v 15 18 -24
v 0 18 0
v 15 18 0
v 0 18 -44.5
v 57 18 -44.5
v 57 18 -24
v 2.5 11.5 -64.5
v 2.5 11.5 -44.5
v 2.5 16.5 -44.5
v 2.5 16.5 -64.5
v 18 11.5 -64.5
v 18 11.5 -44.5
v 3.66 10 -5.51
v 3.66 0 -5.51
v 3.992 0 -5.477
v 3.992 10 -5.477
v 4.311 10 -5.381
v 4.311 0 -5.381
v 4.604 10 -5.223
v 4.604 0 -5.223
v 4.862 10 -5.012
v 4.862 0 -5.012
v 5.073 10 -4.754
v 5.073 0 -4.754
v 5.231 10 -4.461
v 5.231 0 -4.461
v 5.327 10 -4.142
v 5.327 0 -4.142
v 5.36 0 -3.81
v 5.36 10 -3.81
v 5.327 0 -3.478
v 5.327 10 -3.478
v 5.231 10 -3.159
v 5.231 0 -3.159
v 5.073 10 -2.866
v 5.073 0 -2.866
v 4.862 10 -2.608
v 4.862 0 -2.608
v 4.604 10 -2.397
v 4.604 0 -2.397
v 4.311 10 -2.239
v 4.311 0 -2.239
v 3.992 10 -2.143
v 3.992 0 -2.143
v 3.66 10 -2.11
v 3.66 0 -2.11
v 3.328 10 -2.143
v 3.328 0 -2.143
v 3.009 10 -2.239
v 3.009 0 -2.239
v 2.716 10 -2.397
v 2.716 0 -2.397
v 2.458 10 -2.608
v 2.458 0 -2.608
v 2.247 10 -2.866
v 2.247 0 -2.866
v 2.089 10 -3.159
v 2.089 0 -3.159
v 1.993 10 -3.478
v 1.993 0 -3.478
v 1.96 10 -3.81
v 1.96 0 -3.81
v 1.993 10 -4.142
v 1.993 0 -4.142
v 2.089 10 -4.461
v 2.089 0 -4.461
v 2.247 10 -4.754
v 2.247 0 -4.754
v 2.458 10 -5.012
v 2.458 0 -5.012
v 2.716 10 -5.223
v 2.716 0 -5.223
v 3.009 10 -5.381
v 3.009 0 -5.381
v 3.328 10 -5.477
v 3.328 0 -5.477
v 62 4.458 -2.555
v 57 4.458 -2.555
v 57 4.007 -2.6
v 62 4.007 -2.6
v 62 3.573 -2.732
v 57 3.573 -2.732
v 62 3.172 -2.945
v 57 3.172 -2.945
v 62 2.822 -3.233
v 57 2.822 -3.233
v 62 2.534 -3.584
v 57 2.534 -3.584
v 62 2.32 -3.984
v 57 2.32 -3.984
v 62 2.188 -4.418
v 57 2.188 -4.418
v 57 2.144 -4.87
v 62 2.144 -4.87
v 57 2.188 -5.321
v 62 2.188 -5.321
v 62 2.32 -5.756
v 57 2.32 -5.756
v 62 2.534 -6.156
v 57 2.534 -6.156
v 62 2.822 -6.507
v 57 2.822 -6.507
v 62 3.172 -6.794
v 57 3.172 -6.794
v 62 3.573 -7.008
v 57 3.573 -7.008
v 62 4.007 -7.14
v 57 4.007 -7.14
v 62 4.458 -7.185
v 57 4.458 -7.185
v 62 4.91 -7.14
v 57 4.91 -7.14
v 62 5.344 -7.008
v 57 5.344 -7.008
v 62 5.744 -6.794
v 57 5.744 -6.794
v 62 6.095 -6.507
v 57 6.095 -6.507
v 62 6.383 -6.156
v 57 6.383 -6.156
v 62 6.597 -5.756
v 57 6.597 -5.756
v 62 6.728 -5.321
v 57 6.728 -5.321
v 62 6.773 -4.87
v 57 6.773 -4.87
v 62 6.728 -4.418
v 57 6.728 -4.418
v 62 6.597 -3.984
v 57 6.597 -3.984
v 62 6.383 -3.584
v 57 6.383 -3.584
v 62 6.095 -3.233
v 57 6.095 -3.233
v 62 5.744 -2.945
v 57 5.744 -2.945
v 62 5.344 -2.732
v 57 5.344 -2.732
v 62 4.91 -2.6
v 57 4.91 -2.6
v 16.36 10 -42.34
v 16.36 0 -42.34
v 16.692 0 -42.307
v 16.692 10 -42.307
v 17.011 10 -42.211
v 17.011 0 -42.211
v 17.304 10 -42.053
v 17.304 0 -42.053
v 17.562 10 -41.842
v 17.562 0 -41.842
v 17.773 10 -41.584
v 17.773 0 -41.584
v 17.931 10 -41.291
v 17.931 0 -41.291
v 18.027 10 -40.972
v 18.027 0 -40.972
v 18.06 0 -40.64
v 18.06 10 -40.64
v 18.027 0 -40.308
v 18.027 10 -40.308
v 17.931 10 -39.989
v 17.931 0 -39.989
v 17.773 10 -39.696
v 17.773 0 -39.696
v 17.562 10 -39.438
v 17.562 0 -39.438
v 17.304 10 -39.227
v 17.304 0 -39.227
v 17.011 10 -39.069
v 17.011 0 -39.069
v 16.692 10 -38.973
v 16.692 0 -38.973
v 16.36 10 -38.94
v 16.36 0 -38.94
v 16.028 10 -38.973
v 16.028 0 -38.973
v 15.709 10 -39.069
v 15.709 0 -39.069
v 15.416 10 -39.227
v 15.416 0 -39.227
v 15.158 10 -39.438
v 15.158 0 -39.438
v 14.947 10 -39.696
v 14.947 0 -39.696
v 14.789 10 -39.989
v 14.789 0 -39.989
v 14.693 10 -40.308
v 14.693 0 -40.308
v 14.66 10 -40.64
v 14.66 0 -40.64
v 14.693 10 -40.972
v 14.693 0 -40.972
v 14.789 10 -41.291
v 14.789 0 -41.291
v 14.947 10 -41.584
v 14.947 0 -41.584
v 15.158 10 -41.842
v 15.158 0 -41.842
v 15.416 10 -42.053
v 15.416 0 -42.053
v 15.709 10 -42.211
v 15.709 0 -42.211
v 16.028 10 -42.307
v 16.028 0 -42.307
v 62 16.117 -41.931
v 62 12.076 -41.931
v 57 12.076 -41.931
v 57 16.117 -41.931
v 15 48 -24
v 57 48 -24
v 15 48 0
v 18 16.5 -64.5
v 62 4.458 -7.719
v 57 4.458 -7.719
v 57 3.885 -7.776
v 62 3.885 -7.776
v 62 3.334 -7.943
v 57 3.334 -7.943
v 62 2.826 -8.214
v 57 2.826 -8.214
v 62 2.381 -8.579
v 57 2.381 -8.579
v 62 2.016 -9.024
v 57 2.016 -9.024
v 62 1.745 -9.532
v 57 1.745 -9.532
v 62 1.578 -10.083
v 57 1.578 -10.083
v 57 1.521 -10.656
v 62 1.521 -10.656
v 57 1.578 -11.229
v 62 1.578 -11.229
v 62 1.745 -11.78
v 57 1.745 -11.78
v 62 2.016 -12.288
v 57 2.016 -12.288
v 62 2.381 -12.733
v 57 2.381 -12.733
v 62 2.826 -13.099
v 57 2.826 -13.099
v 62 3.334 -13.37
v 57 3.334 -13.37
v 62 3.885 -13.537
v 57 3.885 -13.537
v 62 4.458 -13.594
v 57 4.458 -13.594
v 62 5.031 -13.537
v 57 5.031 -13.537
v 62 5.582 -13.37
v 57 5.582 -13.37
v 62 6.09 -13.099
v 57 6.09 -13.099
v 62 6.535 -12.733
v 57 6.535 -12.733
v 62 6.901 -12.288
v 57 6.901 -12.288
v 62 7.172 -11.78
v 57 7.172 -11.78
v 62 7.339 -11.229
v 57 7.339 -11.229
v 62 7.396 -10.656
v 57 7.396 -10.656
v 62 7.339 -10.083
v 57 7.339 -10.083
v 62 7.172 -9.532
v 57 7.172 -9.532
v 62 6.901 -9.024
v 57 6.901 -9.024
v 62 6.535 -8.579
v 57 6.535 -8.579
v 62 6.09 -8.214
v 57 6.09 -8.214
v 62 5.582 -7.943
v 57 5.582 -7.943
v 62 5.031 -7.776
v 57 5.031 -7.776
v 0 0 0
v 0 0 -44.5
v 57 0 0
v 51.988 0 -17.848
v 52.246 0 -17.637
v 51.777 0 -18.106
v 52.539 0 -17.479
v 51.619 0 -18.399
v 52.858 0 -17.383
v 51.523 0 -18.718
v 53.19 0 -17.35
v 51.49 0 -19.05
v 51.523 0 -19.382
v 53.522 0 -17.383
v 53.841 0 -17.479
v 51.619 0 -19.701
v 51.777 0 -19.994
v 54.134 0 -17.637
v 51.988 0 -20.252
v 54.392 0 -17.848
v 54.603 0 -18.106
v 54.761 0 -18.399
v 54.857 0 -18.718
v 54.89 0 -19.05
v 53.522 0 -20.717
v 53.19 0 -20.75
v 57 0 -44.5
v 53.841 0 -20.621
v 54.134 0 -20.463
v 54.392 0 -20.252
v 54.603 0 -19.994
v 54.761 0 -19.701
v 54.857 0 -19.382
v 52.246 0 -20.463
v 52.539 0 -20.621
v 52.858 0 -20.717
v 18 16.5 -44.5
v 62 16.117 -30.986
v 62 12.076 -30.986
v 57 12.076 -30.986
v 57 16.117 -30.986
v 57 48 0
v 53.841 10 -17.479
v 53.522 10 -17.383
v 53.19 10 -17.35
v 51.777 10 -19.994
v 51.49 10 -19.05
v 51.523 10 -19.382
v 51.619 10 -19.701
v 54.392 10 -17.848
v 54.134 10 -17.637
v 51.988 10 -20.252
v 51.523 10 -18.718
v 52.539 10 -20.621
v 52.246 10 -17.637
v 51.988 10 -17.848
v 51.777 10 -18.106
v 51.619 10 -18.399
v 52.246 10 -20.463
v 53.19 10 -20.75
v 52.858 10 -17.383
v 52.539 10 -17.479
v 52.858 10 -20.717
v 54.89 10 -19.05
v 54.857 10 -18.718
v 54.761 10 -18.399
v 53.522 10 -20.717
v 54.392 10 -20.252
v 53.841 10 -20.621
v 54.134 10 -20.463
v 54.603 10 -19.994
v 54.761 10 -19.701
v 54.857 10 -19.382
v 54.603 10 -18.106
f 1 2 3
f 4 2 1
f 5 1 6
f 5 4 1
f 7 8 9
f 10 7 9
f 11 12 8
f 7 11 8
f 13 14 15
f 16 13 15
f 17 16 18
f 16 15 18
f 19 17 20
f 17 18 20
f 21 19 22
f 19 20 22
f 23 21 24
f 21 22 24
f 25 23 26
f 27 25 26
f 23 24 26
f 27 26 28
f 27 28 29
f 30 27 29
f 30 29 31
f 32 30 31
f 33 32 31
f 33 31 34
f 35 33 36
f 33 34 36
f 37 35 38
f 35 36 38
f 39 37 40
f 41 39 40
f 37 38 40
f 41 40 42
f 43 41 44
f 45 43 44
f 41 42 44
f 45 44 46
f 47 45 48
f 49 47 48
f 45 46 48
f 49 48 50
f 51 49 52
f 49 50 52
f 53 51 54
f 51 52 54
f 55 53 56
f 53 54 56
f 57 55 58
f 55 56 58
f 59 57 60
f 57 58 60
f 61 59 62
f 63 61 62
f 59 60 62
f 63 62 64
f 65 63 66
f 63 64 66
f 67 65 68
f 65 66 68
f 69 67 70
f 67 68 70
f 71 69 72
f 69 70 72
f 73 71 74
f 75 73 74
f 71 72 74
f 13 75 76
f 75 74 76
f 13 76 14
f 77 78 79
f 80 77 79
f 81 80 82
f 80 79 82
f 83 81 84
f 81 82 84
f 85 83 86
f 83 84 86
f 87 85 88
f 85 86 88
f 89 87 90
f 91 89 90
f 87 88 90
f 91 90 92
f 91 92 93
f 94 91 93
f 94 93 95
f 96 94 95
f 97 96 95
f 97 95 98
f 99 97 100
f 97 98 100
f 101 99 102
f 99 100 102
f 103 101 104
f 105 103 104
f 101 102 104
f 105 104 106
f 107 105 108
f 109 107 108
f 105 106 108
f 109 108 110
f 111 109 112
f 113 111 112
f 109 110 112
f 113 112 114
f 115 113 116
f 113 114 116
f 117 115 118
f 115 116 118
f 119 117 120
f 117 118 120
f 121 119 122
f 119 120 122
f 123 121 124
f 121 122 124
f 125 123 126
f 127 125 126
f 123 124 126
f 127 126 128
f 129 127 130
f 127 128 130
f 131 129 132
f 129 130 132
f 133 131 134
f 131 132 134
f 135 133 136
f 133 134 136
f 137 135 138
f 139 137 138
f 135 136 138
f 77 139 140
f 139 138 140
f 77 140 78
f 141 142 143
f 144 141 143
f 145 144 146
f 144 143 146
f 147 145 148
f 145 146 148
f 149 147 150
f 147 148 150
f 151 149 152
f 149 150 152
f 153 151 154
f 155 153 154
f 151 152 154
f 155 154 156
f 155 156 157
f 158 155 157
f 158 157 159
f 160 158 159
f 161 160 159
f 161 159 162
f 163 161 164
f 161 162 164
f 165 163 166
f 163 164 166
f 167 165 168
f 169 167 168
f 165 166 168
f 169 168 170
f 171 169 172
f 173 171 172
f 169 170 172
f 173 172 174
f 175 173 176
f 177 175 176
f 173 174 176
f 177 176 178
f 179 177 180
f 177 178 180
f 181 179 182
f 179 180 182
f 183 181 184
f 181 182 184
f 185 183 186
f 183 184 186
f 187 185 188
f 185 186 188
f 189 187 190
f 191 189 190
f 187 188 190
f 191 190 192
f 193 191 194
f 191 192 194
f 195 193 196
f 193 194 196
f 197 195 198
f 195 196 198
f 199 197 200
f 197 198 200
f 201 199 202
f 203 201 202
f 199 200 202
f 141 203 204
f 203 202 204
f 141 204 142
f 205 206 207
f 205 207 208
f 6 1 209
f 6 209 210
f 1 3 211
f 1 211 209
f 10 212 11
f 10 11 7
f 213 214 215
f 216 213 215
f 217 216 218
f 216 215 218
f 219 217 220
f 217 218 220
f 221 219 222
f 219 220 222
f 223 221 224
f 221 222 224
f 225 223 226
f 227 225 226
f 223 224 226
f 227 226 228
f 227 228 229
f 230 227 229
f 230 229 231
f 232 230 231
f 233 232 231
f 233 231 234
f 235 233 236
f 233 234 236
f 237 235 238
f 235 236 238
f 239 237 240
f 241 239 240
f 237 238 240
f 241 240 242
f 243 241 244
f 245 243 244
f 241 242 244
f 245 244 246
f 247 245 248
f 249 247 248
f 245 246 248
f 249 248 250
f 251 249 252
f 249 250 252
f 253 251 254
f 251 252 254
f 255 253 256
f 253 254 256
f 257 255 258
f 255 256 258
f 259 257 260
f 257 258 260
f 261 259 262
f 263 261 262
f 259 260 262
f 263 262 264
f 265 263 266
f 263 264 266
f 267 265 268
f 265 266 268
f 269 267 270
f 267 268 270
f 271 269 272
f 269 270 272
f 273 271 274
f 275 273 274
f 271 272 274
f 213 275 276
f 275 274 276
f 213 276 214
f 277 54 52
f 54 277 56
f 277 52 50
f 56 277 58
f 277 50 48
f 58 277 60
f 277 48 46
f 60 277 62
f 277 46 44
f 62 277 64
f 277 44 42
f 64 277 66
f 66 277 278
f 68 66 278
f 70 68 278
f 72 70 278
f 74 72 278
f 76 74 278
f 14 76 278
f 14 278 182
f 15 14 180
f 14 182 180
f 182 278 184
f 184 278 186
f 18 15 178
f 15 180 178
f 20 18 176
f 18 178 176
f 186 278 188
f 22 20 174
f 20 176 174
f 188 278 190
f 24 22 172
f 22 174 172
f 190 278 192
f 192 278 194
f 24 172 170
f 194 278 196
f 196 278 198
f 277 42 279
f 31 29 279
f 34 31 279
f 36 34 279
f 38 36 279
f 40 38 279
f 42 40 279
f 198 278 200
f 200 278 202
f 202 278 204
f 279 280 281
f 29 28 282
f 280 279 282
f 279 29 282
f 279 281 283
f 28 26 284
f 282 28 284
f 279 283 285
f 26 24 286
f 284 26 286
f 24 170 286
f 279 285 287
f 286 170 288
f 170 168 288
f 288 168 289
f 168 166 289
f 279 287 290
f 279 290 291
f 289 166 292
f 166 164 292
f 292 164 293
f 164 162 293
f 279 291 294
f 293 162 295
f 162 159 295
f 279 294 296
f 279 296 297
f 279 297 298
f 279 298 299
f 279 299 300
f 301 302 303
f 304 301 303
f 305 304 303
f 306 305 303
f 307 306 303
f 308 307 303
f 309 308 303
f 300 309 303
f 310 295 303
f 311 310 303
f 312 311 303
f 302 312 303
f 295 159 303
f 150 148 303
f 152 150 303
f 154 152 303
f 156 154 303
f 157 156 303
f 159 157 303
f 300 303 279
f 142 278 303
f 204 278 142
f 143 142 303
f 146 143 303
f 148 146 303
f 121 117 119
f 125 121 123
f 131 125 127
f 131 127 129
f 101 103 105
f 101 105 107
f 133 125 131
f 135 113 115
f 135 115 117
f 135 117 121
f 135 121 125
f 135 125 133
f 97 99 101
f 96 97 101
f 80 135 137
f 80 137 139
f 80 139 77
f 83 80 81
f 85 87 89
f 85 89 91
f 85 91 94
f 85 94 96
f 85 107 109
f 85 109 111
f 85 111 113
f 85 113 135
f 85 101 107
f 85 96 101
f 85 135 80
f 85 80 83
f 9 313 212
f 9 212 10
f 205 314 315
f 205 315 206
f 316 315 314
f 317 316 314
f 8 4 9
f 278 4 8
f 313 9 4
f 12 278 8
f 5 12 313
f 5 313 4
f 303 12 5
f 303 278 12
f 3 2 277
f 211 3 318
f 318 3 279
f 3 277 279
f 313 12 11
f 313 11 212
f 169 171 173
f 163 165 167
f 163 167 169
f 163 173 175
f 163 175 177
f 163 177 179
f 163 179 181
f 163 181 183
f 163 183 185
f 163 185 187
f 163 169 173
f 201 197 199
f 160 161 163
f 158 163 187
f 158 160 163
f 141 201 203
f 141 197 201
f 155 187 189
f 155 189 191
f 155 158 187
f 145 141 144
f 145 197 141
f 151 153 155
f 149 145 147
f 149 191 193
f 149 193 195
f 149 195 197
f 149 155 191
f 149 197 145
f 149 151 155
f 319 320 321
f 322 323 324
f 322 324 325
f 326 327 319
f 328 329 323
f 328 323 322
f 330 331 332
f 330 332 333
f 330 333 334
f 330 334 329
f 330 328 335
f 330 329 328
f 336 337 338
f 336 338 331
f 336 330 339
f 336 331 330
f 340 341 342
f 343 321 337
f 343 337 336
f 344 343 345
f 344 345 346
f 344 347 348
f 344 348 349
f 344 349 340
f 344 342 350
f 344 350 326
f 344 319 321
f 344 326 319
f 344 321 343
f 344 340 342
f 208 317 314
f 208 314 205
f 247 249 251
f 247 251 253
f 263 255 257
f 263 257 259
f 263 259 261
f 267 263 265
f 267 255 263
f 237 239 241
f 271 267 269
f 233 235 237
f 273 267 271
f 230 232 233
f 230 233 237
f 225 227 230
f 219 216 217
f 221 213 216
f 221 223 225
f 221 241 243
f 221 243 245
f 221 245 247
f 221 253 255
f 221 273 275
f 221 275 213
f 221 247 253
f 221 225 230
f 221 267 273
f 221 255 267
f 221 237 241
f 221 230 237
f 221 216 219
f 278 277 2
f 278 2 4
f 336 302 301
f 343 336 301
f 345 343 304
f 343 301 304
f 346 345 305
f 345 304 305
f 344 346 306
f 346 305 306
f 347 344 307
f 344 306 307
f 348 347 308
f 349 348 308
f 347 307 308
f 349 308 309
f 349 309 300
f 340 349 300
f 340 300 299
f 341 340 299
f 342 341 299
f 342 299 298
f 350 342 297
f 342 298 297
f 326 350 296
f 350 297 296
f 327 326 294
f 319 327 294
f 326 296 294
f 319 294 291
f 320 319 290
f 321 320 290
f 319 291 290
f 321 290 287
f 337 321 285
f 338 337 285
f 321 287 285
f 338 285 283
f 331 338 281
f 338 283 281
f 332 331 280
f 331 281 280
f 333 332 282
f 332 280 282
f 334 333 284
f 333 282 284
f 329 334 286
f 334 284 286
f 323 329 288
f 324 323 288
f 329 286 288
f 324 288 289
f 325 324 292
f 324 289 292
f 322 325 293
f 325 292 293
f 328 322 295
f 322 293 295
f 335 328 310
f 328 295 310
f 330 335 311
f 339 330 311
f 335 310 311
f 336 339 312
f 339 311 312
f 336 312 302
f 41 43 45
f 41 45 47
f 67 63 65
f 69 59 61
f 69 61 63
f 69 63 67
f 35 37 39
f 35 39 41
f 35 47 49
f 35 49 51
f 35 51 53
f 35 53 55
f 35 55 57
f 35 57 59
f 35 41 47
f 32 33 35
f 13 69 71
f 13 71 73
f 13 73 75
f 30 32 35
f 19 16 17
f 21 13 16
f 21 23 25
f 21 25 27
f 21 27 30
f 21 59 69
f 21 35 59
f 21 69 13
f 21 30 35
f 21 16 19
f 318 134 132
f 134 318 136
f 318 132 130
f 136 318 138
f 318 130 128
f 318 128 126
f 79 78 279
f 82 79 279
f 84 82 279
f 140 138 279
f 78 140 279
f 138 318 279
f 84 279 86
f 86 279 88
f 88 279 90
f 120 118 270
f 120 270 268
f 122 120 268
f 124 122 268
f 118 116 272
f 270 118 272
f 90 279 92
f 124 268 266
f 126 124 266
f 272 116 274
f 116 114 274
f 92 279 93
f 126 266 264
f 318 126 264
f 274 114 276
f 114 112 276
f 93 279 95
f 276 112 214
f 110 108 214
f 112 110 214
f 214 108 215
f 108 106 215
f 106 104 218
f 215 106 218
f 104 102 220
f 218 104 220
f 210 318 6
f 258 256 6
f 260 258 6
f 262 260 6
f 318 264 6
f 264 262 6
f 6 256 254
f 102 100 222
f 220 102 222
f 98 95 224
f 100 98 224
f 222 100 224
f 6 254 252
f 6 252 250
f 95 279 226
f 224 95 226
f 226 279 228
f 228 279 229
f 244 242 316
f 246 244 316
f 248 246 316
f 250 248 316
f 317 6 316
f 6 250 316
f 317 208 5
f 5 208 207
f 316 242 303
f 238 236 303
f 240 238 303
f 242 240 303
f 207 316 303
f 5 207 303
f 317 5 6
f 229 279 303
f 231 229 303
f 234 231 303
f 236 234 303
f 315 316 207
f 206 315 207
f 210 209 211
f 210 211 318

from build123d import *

# Parameters (mm, degrees)
SKETCH1_W           = 57
SKETCH1_H           = 44.5
BOSS_EXTRUDE1_DEPTH = 18
SKETCH2_R           = 2.314555985
SKETCH2_R_2         = 2.937250919
SKETCH2_W           = 10.945123542
SKETCH2_H           = 4.040448377
BOSS_EXTRUDE2_DEPTH = 5
SKETCH3_W           = 42
SKETCH3_H           = 24
BOSS_EXTRUDE3_DEPTH = 30
SKETCH4_W           = 15.5
SKETCH4_H           = 5
BOSS_EXTRUDE4_DEPTH = 20
SKETCH5_R           = 1.7
CUT_EXTRUDE1_DEPTH  = 10


with BuildPart() as part:
    # Sketch1 → Boss-Extrude1 (new body)
    with BuildSketch(Plane(origin=(0, 0, 0), x_dir=(1, 0, 0), z_dir=(0, 1, 0))):
        with Locations((28.5, 22.25)):
            Rectangle(SKETCH1_W, SKETCH1_H)
    extrude(amount=BOSS_EXTRUDE1_DEPTH)

    # Sketch2 → Boss-Extrude2 (add)
    with BuildSketch(Plane(origin=(57, 0, 0), x_dir=(0, 0, -1), z_dir=(1, 0, 0))):
        with Locations(Location((4.869948731, 4.458338777, 0), (0, 0, 180))):
            Circle(SKETCH2_R)
        with Locations(Location((10.656338694, 4.458338777, 0), (0, 0, 180))):
            Circle(SKETCH2_R_2)
        with Locations((36.458792801, 14.096318992)):
            Rectangle(SKETCH2_W, SKETCH2_H)
    extrude(amount=BOSS_EXTRUDE2_DEPTH)

    # Sketch3 → Boss-Extrude3 (add)
    with BuildSketch(Plane(origin=(0, 18, 0), x_dir=(1, 0, 0), z_dir=(0, 1, 0))):
        with Locations((36, 12)):
            Rectangle(SKETCH3_W, SKETCH3_H)
    extrude(amount=BOSS_EXTRUDE3_DEPTH)

    # Sketch4 → Boss-Extrude4 (add)
    with BuildSketch(Plane(origin=(0, 0, -44.5), x_dir=(-1, 0, 0), z_dir=(0, 0, -1))):
        with Locations((-10.25, 14)):
            Rectangle(SKETCH4_W, SKETCH4_H)
    extrude(amount=BOSS_EXTRUDE4_DEPTH)

    # Sketch5 → Cut-Extrude1 (cut)
    with BuildSketch(Plane.XZ):
        with Locations(Location((3.66, -3.81, 0), (0, 0, 270))):
            Circle(SKETCH5_R)
        with Locations(Location((16.36, -40.64, 0), (0, 0, 270))):
            Circle(SKETCH5_R)
        with Locations(Location((53.19, -19.05, 0), (0, 0, 270))):
            Circle(SKETCH5_R)
    extrude(amount=-CUT_EXTRUDE1_DEPTH, mode=Mode.SUBTRACT)


solid = part.part
